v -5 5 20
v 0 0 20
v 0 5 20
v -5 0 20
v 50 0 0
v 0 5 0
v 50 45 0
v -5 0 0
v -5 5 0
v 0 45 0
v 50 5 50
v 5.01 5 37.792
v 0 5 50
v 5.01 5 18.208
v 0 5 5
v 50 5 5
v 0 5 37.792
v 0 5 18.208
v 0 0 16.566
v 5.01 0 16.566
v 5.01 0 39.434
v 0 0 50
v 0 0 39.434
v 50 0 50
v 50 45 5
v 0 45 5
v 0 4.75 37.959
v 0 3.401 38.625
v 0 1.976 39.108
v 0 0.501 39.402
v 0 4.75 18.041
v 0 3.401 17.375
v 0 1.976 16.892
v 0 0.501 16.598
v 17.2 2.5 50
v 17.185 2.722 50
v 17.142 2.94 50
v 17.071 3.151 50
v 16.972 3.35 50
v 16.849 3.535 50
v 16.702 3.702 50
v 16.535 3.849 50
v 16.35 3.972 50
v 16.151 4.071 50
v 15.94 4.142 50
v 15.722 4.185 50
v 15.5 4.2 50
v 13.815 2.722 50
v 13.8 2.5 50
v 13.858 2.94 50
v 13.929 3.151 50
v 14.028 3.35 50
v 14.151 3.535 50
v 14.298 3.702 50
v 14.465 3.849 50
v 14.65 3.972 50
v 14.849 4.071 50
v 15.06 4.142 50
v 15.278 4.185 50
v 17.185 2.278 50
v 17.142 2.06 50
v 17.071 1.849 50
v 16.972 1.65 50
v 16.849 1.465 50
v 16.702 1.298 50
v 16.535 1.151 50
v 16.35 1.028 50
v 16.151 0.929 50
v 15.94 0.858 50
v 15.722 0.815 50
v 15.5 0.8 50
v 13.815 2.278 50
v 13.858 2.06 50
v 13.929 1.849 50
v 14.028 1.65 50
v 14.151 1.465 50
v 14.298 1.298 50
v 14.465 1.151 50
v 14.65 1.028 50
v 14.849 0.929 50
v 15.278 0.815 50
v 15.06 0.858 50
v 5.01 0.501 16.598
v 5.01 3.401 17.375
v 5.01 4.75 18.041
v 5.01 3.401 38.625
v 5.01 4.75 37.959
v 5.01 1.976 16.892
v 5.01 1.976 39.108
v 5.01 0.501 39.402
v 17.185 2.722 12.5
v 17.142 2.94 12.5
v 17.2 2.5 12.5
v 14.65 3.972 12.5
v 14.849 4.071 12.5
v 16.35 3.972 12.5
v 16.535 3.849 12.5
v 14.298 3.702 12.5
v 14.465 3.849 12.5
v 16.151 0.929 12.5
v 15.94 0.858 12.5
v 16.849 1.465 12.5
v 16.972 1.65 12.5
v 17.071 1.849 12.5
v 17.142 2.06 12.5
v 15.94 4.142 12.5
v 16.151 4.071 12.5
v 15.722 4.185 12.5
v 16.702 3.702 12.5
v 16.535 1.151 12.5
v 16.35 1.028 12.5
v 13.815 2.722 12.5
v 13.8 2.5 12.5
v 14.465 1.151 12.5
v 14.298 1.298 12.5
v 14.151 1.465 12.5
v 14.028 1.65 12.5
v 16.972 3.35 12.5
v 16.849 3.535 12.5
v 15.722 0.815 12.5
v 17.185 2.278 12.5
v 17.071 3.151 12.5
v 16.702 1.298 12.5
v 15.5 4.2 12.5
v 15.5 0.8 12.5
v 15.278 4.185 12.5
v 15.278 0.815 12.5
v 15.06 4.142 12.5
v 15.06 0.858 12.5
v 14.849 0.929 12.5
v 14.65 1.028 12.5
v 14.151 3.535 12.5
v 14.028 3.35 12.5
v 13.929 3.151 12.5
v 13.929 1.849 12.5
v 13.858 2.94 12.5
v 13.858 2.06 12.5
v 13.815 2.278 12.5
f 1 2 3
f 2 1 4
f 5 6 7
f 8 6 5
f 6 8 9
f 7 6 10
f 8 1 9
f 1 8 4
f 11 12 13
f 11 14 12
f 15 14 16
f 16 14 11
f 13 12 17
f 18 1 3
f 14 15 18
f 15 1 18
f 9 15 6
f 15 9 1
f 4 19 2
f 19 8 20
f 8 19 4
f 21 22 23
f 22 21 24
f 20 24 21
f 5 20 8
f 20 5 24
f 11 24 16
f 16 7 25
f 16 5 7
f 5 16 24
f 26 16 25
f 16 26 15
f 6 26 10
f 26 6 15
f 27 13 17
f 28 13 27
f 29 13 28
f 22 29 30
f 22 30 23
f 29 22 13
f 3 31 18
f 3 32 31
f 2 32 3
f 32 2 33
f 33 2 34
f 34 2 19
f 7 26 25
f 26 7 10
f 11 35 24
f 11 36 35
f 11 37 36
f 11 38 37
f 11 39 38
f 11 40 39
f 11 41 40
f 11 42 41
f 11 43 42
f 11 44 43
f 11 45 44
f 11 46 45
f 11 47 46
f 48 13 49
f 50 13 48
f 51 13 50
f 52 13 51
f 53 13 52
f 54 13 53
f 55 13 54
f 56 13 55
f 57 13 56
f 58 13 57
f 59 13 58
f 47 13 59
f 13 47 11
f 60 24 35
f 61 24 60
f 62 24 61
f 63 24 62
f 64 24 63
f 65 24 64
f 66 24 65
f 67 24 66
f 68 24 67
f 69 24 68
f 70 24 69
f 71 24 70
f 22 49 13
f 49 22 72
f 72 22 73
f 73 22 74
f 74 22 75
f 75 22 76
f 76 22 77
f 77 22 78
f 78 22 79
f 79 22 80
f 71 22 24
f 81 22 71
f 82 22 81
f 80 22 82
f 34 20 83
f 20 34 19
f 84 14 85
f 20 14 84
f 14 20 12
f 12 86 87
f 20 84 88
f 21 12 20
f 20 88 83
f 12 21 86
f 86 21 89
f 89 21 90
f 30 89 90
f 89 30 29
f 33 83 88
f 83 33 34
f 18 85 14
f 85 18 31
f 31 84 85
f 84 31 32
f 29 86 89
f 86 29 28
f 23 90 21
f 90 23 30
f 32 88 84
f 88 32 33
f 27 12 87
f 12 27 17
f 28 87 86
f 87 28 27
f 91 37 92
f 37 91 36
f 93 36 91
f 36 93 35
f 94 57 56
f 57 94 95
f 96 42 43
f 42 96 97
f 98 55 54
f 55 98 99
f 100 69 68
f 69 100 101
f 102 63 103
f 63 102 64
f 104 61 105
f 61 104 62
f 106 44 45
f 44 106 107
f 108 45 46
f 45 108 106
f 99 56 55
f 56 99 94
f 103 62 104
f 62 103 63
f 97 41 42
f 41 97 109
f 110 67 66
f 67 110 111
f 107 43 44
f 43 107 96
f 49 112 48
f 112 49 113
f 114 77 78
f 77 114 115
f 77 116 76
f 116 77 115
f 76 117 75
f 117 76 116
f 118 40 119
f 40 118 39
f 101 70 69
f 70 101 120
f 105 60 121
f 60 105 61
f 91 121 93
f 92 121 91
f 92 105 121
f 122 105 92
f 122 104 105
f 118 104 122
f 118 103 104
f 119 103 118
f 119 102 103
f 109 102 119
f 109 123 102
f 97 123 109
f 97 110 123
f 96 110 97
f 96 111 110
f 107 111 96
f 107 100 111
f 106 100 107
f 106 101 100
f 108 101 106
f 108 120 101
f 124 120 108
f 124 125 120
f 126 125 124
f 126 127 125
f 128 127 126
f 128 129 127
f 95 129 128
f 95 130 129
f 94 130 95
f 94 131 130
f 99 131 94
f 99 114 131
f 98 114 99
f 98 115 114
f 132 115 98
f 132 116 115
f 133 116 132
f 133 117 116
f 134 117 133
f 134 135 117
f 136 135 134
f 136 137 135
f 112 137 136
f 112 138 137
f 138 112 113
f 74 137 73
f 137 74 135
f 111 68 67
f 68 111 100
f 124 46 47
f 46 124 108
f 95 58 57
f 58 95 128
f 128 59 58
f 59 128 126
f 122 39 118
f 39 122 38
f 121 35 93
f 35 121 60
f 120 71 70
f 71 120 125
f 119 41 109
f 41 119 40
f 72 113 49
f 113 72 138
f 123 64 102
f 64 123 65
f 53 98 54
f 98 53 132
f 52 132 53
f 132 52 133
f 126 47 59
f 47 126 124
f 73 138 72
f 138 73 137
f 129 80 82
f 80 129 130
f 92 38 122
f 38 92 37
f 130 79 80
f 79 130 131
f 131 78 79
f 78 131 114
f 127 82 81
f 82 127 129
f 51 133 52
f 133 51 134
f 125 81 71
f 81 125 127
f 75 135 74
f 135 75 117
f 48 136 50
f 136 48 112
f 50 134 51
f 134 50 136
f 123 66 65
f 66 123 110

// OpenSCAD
// L-shaped mounting bracket for a NEMA 17 stepper motor (e.g. a syringe pump).
// Base plate: x -25..25, y 0..45, z 0..5 with two vertical through-holes (M4) at
// (x = -17, y = 30) and (x = 17, y = 30). Vertical motor plate: x -25..25, y 0..5,
// z 0..50, standing on the back edge of the base. Through the motor plate (along Y)
// cut a 23 mm hole for the motor's centring boss (centre x = 0, z = 28) and four
// 3.4 mm holes for M3 screws on a 31 mm square pattern centred on the boss hole.
// Two triangular gussets, 5 mm thick, flush with the left and right edges
// (x = -25 to -20 and x = 20 to 25): each is a right triangle in the YZ plane with
// legs 20 mm along +Y and 20 mm along +Z, its right-angle corner at y = 5, z = 5
// (where the plates meet).
//

base_x  = 25;
base_y  = 45;
base_z  = 5;
screw_h = 4.5;
hole_x1 = -17;
hole_y1 = 30;
hole_x2 = 17;
hole_y2 = 30;

motor_x = 25;
motor_y = 5;
motor_z = 50;
boss_d  = 23;
boss_x  = 0;
boss_z  = 28;
screw_d = 3.4;
screw_p = 31;

gusset_t = 5;
gusset_l = 20;
gusset_h = 20;
gusset_y = 5;
gusset_z = 5;

$fn = 48;

difference() {
    union() {
        cube([base_x * 2, base_y, base_z]);                                     // base plate
        cube([motor_x * 2, motor_y, motor_z]);                                 // vertical motor plate
        for (x = [-1, 1])
            translate([x * (base_x - gusset_l), 0, 0])
                cube([gusset_l, gusset_y, gusset_h]);                        // gussets (left and right)
    }
    for (i = [0, 1])                                                           // two vertical through-holes (M4)
        translate([hole_x1, hole_y1, 0])
            cylinder(h = base_z + motor_z, d = screw_h, $fn = 48);
    for (i = [0, 1])                                                           // motor boss hole (along Y)
        translate([boss_x, -1, boss_z])
            rotate([0, 90, 0])
                cylinder(h = motor_y + 0.01, d = boss_d);
    for (dx = [-1, 1])
        for (dz = [-1, 1])                                           // M3 screw holes (31 mm square, centred on boss hole)
            translate([boss_x + dx * screw_p / 2, motor_y / 2, boss_z + dz * screw_p / 2])
                cylinder(h = motor_z + 1, d = screw_d);
}
